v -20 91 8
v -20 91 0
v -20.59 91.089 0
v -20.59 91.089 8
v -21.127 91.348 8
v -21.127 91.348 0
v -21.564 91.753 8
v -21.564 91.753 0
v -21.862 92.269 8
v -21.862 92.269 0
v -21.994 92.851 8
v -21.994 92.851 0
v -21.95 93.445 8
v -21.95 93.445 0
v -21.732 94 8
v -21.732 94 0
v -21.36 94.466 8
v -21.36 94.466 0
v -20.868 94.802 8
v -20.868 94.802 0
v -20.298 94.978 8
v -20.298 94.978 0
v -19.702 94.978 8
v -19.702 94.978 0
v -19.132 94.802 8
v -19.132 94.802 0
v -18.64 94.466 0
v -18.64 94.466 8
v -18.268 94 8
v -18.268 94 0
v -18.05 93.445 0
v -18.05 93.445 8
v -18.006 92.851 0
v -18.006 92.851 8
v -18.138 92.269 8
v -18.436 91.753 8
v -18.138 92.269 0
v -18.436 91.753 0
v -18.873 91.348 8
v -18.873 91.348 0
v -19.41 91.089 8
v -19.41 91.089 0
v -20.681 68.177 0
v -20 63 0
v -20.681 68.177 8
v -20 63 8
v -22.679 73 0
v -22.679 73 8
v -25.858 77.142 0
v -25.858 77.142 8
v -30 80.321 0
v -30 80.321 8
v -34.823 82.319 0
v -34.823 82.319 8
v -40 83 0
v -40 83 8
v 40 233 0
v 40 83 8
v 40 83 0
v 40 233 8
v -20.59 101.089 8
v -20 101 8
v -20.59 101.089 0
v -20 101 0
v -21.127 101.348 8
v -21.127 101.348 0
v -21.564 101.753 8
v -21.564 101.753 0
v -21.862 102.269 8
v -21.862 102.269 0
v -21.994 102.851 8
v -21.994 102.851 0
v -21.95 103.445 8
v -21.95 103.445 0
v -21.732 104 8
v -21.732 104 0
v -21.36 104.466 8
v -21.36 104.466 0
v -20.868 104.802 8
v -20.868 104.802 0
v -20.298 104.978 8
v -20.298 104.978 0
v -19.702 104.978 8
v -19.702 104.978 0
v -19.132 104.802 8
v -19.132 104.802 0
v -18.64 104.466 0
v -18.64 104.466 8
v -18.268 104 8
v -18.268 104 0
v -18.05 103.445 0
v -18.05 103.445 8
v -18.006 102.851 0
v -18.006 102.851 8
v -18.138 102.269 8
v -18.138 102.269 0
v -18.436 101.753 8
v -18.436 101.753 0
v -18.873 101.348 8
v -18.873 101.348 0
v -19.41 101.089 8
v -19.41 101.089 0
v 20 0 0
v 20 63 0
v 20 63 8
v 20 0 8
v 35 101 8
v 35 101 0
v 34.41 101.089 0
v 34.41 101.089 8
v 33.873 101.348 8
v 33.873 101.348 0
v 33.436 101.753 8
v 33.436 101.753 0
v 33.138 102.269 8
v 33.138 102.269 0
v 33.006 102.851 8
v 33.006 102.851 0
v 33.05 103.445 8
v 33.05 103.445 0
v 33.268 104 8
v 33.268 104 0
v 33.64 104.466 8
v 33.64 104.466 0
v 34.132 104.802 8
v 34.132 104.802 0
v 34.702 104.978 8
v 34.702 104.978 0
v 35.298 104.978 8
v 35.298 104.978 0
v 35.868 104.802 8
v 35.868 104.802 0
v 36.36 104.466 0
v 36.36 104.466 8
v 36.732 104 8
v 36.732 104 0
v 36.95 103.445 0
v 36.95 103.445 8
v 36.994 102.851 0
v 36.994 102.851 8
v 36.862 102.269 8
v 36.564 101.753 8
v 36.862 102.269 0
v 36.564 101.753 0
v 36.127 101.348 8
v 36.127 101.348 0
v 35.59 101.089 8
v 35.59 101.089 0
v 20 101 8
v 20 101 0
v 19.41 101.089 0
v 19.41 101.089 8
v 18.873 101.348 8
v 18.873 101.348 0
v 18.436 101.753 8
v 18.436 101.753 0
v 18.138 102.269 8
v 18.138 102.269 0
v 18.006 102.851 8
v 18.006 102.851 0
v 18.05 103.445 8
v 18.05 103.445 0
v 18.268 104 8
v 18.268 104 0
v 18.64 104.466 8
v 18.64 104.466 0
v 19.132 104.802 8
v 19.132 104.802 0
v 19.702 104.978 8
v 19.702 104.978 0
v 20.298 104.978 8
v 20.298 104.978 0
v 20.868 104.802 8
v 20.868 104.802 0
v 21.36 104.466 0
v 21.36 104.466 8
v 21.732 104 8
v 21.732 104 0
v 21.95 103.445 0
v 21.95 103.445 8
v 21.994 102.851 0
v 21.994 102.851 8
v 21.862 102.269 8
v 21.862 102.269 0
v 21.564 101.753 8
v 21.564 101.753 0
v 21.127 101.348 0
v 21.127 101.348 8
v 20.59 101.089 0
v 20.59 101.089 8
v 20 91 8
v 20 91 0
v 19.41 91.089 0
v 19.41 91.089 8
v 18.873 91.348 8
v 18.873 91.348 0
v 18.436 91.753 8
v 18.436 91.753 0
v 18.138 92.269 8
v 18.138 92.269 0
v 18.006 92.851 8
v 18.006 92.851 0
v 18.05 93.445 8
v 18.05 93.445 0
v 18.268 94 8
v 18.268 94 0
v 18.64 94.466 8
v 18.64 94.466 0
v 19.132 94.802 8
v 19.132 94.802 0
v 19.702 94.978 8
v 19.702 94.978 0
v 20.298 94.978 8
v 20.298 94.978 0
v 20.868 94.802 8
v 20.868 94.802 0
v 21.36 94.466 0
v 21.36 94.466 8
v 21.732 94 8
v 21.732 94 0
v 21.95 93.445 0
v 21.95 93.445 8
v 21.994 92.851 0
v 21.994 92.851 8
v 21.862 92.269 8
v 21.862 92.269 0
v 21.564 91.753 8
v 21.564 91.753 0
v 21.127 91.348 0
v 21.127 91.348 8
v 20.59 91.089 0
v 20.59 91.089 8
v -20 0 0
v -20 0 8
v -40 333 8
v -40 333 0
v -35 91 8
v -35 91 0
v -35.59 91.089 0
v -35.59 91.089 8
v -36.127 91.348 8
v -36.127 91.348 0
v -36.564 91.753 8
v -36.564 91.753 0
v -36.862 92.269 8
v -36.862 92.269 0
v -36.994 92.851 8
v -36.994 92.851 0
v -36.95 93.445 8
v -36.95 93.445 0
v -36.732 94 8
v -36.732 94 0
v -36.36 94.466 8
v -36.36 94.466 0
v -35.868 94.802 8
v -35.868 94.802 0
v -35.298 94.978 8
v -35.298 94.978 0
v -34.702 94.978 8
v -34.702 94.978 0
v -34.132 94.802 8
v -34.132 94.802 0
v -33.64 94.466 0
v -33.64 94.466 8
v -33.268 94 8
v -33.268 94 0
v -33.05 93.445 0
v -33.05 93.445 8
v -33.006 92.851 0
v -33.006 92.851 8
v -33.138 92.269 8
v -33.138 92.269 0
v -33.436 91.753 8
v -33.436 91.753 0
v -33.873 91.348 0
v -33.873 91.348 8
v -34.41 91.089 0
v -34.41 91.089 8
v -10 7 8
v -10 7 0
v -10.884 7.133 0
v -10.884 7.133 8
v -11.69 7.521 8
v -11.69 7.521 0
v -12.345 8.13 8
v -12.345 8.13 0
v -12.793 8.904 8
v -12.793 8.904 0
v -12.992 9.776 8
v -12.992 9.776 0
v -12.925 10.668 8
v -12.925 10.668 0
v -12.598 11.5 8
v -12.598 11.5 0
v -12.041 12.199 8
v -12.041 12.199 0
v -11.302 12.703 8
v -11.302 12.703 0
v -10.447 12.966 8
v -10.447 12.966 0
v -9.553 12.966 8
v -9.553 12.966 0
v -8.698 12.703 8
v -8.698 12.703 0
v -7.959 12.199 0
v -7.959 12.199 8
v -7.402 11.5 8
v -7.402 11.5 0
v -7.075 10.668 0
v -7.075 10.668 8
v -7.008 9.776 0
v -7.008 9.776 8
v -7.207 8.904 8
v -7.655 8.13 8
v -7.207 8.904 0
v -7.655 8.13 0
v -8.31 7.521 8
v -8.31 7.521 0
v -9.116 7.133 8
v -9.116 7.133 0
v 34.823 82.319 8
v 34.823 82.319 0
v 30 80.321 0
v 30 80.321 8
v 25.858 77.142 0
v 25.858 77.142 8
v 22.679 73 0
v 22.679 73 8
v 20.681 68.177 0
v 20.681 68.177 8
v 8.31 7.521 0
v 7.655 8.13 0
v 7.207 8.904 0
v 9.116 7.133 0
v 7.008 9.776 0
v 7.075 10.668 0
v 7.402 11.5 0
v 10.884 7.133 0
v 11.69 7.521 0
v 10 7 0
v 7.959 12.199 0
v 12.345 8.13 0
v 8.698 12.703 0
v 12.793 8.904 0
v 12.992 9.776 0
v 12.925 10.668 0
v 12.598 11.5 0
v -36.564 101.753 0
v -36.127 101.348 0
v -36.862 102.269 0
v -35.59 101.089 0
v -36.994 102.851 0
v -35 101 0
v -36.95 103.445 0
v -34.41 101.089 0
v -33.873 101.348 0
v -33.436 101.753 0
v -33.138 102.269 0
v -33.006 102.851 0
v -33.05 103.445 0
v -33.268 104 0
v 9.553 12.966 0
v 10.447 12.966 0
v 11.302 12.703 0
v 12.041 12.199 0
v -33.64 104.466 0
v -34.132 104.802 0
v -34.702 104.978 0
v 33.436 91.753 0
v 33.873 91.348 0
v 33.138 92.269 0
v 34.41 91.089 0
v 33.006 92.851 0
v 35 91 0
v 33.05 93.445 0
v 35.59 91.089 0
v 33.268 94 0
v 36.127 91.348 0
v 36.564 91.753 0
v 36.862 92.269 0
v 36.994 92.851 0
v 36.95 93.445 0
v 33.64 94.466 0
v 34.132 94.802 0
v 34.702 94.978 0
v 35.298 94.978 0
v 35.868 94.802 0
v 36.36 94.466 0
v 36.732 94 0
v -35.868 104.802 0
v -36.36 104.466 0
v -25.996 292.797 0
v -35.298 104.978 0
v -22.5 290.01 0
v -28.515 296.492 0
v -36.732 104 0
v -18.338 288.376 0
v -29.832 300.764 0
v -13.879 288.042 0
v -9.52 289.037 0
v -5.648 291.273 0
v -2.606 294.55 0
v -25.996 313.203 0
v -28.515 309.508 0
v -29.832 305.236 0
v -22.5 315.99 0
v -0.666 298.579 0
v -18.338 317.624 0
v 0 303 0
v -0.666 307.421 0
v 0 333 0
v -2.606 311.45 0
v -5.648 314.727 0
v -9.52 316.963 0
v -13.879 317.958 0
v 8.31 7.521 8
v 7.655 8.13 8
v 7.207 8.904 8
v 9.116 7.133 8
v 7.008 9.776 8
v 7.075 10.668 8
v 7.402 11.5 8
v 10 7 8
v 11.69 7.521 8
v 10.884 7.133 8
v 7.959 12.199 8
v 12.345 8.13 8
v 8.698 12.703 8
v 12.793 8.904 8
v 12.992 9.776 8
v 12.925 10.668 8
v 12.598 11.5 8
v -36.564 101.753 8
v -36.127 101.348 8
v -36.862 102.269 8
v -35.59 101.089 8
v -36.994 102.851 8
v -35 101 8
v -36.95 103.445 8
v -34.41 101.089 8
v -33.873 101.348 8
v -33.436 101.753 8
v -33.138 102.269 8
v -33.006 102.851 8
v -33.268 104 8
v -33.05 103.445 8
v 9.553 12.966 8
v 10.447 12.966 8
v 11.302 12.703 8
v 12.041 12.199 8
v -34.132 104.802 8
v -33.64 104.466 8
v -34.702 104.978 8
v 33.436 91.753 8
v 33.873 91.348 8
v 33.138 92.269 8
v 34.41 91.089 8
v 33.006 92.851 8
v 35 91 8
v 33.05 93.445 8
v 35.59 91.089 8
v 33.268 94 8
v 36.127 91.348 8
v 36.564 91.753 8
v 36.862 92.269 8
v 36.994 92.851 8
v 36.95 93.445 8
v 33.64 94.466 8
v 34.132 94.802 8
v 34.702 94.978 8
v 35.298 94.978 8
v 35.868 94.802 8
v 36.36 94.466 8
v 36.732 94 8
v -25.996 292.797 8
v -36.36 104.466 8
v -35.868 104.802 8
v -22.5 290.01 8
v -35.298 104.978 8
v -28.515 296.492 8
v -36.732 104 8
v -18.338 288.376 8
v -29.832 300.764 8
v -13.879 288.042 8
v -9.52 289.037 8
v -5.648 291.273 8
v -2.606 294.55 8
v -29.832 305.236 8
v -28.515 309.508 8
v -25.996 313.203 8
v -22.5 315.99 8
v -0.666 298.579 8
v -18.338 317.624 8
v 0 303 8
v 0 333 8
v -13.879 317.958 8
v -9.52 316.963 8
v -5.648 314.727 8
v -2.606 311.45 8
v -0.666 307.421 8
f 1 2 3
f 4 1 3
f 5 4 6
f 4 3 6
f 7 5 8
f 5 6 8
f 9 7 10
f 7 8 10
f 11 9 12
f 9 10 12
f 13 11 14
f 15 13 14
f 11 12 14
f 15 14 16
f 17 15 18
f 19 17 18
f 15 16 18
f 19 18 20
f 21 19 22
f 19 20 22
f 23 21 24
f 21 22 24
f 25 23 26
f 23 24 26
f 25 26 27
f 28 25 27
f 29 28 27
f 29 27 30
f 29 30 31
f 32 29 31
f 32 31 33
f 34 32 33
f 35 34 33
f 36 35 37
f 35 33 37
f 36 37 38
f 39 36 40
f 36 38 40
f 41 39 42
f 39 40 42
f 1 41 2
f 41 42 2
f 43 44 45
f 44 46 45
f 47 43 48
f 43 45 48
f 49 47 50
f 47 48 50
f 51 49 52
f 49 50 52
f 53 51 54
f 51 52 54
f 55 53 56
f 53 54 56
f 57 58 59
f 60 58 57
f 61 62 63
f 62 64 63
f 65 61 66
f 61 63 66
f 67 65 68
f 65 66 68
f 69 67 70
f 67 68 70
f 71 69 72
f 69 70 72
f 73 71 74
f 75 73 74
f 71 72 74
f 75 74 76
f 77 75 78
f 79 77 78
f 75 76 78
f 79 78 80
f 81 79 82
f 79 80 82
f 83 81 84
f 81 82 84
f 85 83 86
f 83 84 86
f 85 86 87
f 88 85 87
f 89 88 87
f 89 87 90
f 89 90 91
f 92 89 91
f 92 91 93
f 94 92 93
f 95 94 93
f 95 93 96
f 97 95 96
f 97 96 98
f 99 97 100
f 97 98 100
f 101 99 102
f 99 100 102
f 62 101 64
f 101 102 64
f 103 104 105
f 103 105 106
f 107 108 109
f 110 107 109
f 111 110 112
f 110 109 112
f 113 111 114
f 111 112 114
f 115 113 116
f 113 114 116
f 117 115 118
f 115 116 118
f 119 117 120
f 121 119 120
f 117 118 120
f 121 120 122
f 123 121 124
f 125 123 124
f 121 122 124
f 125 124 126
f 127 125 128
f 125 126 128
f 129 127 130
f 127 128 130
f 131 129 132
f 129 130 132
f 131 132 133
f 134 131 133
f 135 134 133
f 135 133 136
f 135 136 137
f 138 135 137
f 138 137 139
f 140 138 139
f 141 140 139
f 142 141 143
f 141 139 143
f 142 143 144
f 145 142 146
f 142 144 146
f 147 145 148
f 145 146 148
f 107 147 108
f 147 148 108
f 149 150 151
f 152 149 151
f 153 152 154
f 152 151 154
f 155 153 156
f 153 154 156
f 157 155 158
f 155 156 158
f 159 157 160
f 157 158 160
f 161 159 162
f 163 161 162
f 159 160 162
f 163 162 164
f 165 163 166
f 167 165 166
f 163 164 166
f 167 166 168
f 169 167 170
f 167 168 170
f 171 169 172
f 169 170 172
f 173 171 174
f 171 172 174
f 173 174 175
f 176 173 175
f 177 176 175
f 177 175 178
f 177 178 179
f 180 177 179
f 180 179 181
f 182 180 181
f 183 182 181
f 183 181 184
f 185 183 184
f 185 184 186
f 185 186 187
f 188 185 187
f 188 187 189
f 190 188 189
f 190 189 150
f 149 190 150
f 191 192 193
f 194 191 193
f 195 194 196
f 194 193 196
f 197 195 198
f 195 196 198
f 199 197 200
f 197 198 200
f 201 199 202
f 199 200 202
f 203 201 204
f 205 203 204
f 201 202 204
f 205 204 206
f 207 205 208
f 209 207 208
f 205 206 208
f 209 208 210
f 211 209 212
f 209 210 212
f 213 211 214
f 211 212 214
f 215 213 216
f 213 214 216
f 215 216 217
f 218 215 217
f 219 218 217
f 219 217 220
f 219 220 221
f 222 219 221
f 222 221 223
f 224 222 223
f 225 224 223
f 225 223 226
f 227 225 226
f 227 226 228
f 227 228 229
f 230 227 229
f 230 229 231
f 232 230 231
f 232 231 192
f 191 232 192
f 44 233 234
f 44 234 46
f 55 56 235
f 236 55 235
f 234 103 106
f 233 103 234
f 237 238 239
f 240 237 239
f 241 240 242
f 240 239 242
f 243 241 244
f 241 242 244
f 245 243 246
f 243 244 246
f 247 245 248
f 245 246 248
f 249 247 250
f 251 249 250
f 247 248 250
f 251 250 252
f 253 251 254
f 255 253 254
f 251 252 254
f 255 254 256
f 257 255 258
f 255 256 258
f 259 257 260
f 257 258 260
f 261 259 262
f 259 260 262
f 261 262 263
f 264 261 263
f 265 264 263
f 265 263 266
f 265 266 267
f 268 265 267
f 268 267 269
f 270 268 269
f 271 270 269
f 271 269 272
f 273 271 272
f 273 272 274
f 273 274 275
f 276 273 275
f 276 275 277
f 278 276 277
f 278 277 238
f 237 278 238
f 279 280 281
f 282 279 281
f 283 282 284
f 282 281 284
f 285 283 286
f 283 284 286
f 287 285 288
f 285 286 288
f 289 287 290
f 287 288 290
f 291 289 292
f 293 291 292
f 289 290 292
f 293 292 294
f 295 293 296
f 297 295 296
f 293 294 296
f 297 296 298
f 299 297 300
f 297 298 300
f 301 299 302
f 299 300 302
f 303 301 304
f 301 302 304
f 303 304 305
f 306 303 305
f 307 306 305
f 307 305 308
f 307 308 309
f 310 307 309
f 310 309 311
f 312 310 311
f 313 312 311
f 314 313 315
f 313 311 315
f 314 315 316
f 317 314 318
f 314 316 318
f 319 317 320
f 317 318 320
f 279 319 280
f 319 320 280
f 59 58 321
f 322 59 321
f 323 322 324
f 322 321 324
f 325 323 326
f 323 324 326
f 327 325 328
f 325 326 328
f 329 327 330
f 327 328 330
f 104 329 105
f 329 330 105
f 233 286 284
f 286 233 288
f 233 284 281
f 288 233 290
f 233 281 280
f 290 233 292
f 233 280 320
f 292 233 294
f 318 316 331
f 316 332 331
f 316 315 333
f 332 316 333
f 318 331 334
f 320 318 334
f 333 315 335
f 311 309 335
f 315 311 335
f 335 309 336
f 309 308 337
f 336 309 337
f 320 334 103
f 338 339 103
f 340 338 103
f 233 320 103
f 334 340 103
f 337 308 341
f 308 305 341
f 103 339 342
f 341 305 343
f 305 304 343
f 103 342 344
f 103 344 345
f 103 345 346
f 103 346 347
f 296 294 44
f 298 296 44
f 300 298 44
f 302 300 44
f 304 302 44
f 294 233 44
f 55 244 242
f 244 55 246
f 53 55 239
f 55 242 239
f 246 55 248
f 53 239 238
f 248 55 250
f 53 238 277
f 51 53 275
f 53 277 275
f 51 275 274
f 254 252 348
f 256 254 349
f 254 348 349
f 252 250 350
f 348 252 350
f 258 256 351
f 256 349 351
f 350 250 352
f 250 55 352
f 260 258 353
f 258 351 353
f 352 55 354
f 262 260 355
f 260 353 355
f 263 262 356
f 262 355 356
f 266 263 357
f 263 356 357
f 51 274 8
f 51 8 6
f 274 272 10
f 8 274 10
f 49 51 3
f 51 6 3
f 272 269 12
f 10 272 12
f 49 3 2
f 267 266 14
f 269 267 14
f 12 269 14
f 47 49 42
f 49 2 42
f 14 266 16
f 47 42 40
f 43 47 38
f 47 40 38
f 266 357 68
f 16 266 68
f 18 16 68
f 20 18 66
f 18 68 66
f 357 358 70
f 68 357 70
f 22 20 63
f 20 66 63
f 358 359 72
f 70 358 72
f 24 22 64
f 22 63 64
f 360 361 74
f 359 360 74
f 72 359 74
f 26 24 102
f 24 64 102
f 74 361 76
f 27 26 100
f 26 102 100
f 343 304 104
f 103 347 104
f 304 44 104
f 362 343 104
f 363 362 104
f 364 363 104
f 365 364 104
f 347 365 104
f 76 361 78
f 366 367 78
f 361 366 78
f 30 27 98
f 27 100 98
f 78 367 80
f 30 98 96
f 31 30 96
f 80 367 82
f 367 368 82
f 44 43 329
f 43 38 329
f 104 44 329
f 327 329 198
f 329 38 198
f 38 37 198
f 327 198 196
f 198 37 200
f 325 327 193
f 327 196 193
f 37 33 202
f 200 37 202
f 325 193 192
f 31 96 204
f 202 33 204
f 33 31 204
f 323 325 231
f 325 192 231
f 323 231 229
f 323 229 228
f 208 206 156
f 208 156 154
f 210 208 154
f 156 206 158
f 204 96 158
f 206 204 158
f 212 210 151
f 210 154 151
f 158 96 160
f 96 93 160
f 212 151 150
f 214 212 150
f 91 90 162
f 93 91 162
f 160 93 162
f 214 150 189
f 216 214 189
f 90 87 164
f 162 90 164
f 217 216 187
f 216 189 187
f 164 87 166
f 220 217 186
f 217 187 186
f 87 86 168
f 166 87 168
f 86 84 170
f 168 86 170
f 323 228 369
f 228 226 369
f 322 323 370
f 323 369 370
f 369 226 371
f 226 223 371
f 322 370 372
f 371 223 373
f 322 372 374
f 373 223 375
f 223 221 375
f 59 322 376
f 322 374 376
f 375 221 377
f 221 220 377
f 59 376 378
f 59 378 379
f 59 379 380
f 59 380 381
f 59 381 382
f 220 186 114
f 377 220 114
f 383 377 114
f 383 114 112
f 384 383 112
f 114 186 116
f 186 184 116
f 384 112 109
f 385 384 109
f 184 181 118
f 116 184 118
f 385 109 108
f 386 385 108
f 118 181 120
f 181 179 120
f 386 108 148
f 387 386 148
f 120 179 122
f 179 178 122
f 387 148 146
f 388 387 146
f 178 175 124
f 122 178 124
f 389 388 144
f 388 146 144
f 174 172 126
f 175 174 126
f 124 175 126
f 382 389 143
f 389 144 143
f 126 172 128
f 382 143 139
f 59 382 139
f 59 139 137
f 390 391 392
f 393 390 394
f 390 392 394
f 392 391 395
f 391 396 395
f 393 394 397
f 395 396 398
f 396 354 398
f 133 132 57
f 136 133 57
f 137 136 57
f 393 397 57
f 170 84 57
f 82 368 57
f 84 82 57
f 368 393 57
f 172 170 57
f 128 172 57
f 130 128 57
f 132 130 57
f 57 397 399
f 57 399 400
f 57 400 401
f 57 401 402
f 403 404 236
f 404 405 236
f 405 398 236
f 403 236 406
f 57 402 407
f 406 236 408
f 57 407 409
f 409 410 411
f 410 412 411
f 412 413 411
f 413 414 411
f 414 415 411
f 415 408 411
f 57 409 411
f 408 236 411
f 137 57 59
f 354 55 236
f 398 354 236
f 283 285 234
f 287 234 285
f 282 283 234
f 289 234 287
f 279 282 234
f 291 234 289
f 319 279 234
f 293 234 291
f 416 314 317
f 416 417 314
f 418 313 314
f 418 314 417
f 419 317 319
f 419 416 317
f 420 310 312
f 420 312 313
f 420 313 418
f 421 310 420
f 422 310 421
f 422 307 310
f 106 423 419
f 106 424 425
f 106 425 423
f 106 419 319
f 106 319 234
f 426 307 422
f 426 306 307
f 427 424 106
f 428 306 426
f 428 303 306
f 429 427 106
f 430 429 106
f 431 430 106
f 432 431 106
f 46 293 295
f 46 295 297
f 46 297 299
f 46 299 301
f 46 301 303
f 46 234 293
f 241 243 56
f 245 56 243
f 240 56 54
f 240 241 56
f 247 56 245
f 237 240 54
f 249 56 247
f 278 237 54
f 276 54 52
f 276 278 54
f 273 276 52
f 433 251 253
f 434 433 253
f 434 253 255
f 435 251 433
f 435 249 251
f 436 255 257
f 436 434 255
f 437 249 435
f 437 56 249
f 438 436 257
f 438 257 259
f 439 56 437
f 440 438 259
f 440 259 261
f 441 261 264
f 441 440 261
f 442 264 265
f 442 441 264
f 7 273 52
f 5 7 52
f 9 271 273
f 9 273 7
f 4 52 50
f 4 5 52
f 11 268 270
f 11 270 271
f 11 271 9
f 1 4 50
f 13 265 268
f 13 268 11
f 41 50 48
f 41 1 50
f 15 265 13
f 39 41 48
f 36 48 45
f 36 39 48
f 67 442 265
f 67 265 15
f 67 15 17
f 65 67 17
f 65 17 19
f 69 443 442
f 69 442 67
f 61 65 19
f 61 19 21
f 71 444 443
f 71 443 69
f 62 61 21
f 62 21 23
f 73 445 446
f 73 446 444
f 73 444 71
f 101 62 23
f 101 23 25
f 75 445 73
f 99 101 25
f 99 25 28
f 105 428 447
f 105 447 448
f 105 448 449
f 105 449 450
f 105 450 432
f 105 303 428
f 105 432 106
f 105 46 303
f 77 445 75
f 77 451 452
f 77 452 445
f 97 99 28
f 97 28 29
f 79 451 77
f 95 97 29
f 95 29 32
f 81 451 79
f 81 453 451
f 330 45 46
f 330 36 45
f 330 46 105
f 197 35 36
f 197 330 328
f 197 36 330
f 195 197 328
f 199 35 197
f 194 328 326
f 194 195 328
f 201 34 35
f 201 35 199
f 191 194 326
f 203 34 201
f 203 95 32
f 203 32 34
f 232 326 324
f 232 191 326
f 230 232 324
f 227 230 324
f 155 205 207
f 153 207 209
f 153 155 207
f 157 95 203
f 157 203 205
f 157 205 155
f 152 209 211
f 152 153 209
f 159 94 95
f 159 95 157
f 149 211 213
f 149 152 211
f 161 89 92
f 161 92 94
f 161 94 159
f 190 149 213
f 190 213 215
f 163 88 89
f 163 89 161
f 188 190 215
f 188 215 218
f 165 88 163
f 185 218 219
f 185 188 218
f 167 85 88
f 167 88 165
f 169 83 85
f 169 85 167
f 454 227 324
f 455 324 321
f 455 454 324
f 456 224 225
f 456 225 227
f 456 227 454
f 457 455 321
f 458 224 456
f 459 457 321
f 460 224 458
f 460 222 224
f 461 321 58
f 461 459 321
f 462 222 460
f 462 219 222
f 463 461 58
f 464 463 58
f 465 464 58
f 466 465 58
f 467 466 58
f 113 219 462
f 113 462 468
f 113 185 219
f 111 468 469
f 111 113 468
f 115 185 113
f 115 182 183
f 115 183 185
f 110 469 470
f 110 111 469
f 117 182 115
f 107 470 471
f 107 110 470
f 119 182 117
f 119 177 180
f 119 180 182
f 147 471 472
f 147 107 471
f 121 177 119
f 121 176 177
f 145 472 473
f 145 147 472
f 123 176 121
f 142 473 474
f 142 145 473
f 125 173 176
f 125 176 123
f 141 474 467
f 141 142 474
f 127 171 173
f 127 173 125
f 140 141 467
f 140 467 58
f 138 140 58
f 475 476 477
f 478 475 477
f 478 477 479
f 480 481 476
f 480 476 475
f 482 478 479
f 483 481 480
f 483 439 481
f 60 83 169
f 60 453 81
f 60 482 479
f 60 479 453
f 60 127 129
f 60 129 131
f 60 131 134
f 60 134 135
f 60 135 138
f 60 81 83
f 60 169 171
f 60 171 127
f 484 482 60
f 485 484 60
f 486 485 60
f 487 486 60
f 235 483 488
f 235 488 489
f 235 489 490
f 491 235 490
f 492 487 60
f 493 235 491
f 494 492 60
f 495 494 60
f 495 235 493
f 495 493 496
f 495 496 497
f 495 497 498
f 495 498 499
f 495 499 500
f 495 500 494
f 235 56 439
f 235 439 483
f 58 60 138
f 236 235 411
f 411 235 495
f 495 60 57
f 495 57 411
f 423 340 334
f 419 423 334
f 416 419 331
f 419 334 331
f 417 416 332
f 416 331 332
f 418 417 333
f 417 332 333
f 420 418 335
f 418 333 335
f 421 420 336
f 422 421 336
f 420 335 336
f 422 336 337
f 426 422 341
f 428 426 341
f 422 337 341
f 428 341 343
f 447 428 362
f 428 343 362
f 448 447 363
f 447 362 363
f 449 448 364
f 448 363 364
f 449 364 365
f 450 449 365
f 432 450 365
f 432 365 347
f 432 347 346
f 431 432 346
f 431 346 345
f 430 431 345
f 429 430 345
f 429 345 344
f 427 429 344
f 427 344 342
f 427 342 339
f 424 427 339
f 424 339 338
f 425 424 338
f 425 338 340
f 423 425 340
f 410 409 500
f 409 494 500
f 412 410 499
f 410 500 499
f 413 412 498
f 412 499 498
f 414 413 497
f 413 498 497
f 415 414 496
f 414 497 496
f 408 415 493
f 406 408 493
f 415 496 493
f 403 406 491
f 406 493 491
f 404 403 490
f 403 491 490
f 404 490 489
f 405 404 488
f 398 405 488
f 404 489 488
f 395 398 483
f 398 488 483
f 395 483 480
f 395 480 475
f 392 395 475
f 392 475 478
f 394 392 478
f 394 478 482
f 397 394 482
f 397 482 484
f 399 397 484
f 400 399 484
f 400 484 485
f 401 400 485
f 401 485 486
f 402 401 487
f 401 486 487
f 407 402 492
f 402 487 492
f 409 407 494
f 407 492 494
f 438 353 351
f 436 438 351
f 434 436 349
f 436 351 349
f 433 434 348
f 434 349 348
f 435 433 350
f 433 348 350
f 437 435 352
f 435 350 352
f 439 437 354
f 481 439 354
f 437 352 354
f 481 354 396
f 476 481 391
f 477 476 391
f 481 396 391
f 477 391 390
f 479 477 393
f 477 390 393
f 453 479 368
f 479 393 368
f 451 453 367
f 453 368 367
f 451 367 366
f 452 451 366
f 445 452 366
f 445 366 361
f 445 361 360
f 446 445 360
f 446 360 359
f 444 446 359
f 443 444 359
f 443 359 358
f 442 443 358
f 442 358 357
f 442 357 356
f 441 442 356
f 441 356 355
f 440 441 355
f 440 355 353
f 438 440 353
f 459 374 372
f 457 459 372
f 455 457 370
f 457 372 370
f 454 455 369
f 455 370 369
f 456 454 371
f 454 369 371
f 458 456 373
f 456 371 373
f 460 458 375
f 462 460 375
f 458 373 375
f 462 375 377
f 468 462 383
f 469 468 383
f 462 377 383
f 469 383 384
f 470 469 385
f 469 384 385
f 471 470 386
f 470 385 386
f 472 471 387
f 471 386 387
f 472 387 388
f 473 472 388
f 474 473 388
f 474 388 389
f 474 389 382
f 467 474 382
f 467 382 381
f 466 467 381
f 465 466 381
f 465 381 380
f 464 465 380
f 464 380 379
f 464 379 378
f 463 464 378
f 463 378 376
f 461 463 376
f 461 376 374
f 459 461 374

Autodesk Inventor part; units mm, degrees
ref_plane "YZ Plane" through (0, 0, 0) normal (1, 0, 0) x (0, 1, 0)
ref_plane "XZ Plane" through (0, 0, 0) normal (0, 1, 0) x (-1, 0, 0)
ref_plane "XY Plane" through (0, 0, 0) normal (0, 0, 1) x (1, 0, 0)
sketch "Szkic1" plane through (0, 0, 0) normal (0, 0, 1) x (1, 0, 0)
  line L0 (0, 0) -> (20, 0)
  line L1 (0, 0) -> (-20, 0)
  line L2 (-20, 0) -> (-20, 20)
  line L3 (-20, 0) -> (0, 0) construction
  line L4 (-20, 20) -> (20, 20)
  line L5 (20, 20) -> (20, 0)
  line L6 (-20, 0) -> (-20, 88)
  line L7 (-20, 88) -> (20, 88)
  line L8 (20, 88) -> (20, 20)
  line L9 (20, 88) -> (20, 93)
  line L10 (20, 93) -> (-20, 93)
  line L11 (-20, 93) -> (-20, 88)
  line L12 (0, 93) -> (35, 93)
  line L13 (35, 93) -> (40, 93)
  line L14 (0, 93) -> (-35, 93)
  line L15 (-35, 93) -> (-40, 93)
  line L16 (-40, 93) -> (-40, 103)
  line L17 (-40, 103) -> (40, 103)
  line L18 (40, 103) -> (40, 93)
  line L19 (-35, 93) -> (-35, 103)
  line L20 (35, 93) -> (35, 103)
  circle A0 centre (-35, 103) radius 1.5
  circle A1 centre (-35, 93) radius 1.5
  circle A2 centre (35, 103) radius 1.5
  circle A3 centre (35, 93) radius 1.5
  line L21 (40, 93) -> (40, 83)
  line L22 (40, 83) -> (20, 83)
  line L23 (-40, 93) -> (-40, 83)
  line L24 (-40, 83) -> (-20, 83)
  line L25 (-40, 103) -> (-40, 183)
  line L26 (40, 103) -> (40, 183)
  line L27 (40, 183) -> (-40, 183)
  dimension "d0" = 20
  dimension "d1" = 20
  dimension "d2" = 20
  dimension "d3" = 90
  dimension "d4" = 88
  dimension "d5" = 5
  dimension "d6" = 35
  dimension "d7" = 5
  dimension "d8" = 35
  dimension "d9" = 5
  dimension "d10" = 10
  dimension "d11" = 3
  dimension "d12" = 3
  dimension "d13" = 3
  dimension "d14" = 3
  dimension "d15" = 10
  dimension "d16" = 10
  dimension "d17" = 80
  dimension "d18" = 80
extrude "Wyciągnięcie proste1" add sketch "Szkic1" along normal blind 8
sketch "Szkic2" plane through (0, 0, 8) normal (0, 0, 1) x (1, 0, 0)
  circle A0 centre (-35, 103) radius 1.5 projected
  circle A1 centre (-35, 93) radius 1.5 projected
  circle A2 centre (35, 103) radius 1.5 projected
  circle A3 centre (35, 93) radius 1.5 projected
  line L0 (-35, 103) -> (35, 103)
  line L1 (-35, 93) -> (35, 93)
  line L2 (-35, 103) -> (-20, 103)
  line L3 (-20, 103) -> (-20, 93)
  line L4 (35, 103) -> (20, 103)
  line L5 (20, 103) -> (20, 93)
  circle A4 centre (-20, 103) radius 2
  circle A5 centre (-20, 93) radius 2
  circle A6 centre (20, 103) radius 2
  circle A7 centre (20, 93) radius 2
  line L6 (40, 83) -> (40, 183) projected
  line L7 (40, 183) -> (-40, 183) projected
  line L8 (-40, 183) -> (-40, 83) projected
  line L9 (-40, 83) -> (-20, 83) projected
  line L10 (-20, 83) -> (-20, 0) projected
  line L11 (-20, 0) -> (20, 0) projected
  line L12 (20, 0) -> (20, 83) projected
  line L13 (20, 83) -> (40, 83) projected
  line L14 (-20, 0) -> (20, 0) projected
  line L15 (-20, 0) -> (-20, 10)
  line L16 (-20, 83) -> (-20, 0) projected
  line L17 (-20, 10) -> (20, 10)
  line L18 (-20, 10) -> (-10, 10)
  line L19 (20, 10) -> (10, 10)
  circle A8 centre (-10, 10) radius 3
  circle A9 centre (10, 10) radius 3
  point P0 (0, 0)
  dimension "d21" = 15
  dimension "d22" = 15
  dimension "d23" = 4
  dimension "d24" = 4
  dimension "d25" = 4
  dimension "d26" = 4
  dimension "d27" = 10
  dimension "d28" = 10
  dimension "d29" = 10
  dimension "d30" = 6
  dimension "d31" = 6
hole "Otwór1" at (-20, 103, 8) at (-20, 93, 8) at (20, 103, 8) at (20, 93, 8) at (-35, 103, 8) at (-35, 93, 8) at (35, 103, 8) at (35, 93, 8) direction (0, 0, -1) diameter 4 end through all
sketch "Szkic3" plane through (0, 0, 8) normal (0, 0, 1) x (1, 0, 0)
  circle A0 centre (-10, 10) radius 3 projected
  circle A1 centre (10, 10) radius 3 projected
  point P0 (0, 0)
hole "Otwór2" at (-10, 10, 8) at (10, 10, 8) direction (0, 0, -1) diameter 6 end through all
fillet "Zaokrąglenie1" radius 20 2 edges at (20, 83, 4) (-20, 83, 4)
sketch "Szkic4" plane through (0, 0, 8) normal (0, 0, 1) x (1, 0, 0)
  line L0 (40, 183) -> (-40, 183) projected
  line L1 (40, 83) -> (40, 183) projected
  line L2 (40, 183) -> (-40, 183)
  line L3 (-40, 183) -> (-40, 333)
  line L4 (-40, 333) -> (0, 333)
  line L5 (40, 183) -> (40, 233)
  line L6 (40, 233) -> (0, 333)
  point P0 (0, 0)
  dimension "d47" = 150
  dimension "d50" = 50
extrude "Wyciągnięcie proste2" add sketch "Szkic4" against normal up to surface (8 mm away)
sketch "Szkic5" plane through (0, 0, 8) normal (0, 0, 1) x (1, 0, 0)
  line L0 (0, 333) -> (-40, 333) projected
  line L1 (-40, 333) -> (-40, 83) projected
  line L2 (-40, 333) -> (-40, 303)
  line L3 (-40, 303) -> (-15, 303)
  circle A0 centre (-15, 303) radius 15
  point P0 (0, 0)
  dimension "d51" = 30
  dimension "d52" = 25
  dimension "d53" = 30
extrude "Wyciągnięcie proste3" cut sketch "Szkic5" against normal up to next
properties part number "Wspornik pionowy osi Y"
